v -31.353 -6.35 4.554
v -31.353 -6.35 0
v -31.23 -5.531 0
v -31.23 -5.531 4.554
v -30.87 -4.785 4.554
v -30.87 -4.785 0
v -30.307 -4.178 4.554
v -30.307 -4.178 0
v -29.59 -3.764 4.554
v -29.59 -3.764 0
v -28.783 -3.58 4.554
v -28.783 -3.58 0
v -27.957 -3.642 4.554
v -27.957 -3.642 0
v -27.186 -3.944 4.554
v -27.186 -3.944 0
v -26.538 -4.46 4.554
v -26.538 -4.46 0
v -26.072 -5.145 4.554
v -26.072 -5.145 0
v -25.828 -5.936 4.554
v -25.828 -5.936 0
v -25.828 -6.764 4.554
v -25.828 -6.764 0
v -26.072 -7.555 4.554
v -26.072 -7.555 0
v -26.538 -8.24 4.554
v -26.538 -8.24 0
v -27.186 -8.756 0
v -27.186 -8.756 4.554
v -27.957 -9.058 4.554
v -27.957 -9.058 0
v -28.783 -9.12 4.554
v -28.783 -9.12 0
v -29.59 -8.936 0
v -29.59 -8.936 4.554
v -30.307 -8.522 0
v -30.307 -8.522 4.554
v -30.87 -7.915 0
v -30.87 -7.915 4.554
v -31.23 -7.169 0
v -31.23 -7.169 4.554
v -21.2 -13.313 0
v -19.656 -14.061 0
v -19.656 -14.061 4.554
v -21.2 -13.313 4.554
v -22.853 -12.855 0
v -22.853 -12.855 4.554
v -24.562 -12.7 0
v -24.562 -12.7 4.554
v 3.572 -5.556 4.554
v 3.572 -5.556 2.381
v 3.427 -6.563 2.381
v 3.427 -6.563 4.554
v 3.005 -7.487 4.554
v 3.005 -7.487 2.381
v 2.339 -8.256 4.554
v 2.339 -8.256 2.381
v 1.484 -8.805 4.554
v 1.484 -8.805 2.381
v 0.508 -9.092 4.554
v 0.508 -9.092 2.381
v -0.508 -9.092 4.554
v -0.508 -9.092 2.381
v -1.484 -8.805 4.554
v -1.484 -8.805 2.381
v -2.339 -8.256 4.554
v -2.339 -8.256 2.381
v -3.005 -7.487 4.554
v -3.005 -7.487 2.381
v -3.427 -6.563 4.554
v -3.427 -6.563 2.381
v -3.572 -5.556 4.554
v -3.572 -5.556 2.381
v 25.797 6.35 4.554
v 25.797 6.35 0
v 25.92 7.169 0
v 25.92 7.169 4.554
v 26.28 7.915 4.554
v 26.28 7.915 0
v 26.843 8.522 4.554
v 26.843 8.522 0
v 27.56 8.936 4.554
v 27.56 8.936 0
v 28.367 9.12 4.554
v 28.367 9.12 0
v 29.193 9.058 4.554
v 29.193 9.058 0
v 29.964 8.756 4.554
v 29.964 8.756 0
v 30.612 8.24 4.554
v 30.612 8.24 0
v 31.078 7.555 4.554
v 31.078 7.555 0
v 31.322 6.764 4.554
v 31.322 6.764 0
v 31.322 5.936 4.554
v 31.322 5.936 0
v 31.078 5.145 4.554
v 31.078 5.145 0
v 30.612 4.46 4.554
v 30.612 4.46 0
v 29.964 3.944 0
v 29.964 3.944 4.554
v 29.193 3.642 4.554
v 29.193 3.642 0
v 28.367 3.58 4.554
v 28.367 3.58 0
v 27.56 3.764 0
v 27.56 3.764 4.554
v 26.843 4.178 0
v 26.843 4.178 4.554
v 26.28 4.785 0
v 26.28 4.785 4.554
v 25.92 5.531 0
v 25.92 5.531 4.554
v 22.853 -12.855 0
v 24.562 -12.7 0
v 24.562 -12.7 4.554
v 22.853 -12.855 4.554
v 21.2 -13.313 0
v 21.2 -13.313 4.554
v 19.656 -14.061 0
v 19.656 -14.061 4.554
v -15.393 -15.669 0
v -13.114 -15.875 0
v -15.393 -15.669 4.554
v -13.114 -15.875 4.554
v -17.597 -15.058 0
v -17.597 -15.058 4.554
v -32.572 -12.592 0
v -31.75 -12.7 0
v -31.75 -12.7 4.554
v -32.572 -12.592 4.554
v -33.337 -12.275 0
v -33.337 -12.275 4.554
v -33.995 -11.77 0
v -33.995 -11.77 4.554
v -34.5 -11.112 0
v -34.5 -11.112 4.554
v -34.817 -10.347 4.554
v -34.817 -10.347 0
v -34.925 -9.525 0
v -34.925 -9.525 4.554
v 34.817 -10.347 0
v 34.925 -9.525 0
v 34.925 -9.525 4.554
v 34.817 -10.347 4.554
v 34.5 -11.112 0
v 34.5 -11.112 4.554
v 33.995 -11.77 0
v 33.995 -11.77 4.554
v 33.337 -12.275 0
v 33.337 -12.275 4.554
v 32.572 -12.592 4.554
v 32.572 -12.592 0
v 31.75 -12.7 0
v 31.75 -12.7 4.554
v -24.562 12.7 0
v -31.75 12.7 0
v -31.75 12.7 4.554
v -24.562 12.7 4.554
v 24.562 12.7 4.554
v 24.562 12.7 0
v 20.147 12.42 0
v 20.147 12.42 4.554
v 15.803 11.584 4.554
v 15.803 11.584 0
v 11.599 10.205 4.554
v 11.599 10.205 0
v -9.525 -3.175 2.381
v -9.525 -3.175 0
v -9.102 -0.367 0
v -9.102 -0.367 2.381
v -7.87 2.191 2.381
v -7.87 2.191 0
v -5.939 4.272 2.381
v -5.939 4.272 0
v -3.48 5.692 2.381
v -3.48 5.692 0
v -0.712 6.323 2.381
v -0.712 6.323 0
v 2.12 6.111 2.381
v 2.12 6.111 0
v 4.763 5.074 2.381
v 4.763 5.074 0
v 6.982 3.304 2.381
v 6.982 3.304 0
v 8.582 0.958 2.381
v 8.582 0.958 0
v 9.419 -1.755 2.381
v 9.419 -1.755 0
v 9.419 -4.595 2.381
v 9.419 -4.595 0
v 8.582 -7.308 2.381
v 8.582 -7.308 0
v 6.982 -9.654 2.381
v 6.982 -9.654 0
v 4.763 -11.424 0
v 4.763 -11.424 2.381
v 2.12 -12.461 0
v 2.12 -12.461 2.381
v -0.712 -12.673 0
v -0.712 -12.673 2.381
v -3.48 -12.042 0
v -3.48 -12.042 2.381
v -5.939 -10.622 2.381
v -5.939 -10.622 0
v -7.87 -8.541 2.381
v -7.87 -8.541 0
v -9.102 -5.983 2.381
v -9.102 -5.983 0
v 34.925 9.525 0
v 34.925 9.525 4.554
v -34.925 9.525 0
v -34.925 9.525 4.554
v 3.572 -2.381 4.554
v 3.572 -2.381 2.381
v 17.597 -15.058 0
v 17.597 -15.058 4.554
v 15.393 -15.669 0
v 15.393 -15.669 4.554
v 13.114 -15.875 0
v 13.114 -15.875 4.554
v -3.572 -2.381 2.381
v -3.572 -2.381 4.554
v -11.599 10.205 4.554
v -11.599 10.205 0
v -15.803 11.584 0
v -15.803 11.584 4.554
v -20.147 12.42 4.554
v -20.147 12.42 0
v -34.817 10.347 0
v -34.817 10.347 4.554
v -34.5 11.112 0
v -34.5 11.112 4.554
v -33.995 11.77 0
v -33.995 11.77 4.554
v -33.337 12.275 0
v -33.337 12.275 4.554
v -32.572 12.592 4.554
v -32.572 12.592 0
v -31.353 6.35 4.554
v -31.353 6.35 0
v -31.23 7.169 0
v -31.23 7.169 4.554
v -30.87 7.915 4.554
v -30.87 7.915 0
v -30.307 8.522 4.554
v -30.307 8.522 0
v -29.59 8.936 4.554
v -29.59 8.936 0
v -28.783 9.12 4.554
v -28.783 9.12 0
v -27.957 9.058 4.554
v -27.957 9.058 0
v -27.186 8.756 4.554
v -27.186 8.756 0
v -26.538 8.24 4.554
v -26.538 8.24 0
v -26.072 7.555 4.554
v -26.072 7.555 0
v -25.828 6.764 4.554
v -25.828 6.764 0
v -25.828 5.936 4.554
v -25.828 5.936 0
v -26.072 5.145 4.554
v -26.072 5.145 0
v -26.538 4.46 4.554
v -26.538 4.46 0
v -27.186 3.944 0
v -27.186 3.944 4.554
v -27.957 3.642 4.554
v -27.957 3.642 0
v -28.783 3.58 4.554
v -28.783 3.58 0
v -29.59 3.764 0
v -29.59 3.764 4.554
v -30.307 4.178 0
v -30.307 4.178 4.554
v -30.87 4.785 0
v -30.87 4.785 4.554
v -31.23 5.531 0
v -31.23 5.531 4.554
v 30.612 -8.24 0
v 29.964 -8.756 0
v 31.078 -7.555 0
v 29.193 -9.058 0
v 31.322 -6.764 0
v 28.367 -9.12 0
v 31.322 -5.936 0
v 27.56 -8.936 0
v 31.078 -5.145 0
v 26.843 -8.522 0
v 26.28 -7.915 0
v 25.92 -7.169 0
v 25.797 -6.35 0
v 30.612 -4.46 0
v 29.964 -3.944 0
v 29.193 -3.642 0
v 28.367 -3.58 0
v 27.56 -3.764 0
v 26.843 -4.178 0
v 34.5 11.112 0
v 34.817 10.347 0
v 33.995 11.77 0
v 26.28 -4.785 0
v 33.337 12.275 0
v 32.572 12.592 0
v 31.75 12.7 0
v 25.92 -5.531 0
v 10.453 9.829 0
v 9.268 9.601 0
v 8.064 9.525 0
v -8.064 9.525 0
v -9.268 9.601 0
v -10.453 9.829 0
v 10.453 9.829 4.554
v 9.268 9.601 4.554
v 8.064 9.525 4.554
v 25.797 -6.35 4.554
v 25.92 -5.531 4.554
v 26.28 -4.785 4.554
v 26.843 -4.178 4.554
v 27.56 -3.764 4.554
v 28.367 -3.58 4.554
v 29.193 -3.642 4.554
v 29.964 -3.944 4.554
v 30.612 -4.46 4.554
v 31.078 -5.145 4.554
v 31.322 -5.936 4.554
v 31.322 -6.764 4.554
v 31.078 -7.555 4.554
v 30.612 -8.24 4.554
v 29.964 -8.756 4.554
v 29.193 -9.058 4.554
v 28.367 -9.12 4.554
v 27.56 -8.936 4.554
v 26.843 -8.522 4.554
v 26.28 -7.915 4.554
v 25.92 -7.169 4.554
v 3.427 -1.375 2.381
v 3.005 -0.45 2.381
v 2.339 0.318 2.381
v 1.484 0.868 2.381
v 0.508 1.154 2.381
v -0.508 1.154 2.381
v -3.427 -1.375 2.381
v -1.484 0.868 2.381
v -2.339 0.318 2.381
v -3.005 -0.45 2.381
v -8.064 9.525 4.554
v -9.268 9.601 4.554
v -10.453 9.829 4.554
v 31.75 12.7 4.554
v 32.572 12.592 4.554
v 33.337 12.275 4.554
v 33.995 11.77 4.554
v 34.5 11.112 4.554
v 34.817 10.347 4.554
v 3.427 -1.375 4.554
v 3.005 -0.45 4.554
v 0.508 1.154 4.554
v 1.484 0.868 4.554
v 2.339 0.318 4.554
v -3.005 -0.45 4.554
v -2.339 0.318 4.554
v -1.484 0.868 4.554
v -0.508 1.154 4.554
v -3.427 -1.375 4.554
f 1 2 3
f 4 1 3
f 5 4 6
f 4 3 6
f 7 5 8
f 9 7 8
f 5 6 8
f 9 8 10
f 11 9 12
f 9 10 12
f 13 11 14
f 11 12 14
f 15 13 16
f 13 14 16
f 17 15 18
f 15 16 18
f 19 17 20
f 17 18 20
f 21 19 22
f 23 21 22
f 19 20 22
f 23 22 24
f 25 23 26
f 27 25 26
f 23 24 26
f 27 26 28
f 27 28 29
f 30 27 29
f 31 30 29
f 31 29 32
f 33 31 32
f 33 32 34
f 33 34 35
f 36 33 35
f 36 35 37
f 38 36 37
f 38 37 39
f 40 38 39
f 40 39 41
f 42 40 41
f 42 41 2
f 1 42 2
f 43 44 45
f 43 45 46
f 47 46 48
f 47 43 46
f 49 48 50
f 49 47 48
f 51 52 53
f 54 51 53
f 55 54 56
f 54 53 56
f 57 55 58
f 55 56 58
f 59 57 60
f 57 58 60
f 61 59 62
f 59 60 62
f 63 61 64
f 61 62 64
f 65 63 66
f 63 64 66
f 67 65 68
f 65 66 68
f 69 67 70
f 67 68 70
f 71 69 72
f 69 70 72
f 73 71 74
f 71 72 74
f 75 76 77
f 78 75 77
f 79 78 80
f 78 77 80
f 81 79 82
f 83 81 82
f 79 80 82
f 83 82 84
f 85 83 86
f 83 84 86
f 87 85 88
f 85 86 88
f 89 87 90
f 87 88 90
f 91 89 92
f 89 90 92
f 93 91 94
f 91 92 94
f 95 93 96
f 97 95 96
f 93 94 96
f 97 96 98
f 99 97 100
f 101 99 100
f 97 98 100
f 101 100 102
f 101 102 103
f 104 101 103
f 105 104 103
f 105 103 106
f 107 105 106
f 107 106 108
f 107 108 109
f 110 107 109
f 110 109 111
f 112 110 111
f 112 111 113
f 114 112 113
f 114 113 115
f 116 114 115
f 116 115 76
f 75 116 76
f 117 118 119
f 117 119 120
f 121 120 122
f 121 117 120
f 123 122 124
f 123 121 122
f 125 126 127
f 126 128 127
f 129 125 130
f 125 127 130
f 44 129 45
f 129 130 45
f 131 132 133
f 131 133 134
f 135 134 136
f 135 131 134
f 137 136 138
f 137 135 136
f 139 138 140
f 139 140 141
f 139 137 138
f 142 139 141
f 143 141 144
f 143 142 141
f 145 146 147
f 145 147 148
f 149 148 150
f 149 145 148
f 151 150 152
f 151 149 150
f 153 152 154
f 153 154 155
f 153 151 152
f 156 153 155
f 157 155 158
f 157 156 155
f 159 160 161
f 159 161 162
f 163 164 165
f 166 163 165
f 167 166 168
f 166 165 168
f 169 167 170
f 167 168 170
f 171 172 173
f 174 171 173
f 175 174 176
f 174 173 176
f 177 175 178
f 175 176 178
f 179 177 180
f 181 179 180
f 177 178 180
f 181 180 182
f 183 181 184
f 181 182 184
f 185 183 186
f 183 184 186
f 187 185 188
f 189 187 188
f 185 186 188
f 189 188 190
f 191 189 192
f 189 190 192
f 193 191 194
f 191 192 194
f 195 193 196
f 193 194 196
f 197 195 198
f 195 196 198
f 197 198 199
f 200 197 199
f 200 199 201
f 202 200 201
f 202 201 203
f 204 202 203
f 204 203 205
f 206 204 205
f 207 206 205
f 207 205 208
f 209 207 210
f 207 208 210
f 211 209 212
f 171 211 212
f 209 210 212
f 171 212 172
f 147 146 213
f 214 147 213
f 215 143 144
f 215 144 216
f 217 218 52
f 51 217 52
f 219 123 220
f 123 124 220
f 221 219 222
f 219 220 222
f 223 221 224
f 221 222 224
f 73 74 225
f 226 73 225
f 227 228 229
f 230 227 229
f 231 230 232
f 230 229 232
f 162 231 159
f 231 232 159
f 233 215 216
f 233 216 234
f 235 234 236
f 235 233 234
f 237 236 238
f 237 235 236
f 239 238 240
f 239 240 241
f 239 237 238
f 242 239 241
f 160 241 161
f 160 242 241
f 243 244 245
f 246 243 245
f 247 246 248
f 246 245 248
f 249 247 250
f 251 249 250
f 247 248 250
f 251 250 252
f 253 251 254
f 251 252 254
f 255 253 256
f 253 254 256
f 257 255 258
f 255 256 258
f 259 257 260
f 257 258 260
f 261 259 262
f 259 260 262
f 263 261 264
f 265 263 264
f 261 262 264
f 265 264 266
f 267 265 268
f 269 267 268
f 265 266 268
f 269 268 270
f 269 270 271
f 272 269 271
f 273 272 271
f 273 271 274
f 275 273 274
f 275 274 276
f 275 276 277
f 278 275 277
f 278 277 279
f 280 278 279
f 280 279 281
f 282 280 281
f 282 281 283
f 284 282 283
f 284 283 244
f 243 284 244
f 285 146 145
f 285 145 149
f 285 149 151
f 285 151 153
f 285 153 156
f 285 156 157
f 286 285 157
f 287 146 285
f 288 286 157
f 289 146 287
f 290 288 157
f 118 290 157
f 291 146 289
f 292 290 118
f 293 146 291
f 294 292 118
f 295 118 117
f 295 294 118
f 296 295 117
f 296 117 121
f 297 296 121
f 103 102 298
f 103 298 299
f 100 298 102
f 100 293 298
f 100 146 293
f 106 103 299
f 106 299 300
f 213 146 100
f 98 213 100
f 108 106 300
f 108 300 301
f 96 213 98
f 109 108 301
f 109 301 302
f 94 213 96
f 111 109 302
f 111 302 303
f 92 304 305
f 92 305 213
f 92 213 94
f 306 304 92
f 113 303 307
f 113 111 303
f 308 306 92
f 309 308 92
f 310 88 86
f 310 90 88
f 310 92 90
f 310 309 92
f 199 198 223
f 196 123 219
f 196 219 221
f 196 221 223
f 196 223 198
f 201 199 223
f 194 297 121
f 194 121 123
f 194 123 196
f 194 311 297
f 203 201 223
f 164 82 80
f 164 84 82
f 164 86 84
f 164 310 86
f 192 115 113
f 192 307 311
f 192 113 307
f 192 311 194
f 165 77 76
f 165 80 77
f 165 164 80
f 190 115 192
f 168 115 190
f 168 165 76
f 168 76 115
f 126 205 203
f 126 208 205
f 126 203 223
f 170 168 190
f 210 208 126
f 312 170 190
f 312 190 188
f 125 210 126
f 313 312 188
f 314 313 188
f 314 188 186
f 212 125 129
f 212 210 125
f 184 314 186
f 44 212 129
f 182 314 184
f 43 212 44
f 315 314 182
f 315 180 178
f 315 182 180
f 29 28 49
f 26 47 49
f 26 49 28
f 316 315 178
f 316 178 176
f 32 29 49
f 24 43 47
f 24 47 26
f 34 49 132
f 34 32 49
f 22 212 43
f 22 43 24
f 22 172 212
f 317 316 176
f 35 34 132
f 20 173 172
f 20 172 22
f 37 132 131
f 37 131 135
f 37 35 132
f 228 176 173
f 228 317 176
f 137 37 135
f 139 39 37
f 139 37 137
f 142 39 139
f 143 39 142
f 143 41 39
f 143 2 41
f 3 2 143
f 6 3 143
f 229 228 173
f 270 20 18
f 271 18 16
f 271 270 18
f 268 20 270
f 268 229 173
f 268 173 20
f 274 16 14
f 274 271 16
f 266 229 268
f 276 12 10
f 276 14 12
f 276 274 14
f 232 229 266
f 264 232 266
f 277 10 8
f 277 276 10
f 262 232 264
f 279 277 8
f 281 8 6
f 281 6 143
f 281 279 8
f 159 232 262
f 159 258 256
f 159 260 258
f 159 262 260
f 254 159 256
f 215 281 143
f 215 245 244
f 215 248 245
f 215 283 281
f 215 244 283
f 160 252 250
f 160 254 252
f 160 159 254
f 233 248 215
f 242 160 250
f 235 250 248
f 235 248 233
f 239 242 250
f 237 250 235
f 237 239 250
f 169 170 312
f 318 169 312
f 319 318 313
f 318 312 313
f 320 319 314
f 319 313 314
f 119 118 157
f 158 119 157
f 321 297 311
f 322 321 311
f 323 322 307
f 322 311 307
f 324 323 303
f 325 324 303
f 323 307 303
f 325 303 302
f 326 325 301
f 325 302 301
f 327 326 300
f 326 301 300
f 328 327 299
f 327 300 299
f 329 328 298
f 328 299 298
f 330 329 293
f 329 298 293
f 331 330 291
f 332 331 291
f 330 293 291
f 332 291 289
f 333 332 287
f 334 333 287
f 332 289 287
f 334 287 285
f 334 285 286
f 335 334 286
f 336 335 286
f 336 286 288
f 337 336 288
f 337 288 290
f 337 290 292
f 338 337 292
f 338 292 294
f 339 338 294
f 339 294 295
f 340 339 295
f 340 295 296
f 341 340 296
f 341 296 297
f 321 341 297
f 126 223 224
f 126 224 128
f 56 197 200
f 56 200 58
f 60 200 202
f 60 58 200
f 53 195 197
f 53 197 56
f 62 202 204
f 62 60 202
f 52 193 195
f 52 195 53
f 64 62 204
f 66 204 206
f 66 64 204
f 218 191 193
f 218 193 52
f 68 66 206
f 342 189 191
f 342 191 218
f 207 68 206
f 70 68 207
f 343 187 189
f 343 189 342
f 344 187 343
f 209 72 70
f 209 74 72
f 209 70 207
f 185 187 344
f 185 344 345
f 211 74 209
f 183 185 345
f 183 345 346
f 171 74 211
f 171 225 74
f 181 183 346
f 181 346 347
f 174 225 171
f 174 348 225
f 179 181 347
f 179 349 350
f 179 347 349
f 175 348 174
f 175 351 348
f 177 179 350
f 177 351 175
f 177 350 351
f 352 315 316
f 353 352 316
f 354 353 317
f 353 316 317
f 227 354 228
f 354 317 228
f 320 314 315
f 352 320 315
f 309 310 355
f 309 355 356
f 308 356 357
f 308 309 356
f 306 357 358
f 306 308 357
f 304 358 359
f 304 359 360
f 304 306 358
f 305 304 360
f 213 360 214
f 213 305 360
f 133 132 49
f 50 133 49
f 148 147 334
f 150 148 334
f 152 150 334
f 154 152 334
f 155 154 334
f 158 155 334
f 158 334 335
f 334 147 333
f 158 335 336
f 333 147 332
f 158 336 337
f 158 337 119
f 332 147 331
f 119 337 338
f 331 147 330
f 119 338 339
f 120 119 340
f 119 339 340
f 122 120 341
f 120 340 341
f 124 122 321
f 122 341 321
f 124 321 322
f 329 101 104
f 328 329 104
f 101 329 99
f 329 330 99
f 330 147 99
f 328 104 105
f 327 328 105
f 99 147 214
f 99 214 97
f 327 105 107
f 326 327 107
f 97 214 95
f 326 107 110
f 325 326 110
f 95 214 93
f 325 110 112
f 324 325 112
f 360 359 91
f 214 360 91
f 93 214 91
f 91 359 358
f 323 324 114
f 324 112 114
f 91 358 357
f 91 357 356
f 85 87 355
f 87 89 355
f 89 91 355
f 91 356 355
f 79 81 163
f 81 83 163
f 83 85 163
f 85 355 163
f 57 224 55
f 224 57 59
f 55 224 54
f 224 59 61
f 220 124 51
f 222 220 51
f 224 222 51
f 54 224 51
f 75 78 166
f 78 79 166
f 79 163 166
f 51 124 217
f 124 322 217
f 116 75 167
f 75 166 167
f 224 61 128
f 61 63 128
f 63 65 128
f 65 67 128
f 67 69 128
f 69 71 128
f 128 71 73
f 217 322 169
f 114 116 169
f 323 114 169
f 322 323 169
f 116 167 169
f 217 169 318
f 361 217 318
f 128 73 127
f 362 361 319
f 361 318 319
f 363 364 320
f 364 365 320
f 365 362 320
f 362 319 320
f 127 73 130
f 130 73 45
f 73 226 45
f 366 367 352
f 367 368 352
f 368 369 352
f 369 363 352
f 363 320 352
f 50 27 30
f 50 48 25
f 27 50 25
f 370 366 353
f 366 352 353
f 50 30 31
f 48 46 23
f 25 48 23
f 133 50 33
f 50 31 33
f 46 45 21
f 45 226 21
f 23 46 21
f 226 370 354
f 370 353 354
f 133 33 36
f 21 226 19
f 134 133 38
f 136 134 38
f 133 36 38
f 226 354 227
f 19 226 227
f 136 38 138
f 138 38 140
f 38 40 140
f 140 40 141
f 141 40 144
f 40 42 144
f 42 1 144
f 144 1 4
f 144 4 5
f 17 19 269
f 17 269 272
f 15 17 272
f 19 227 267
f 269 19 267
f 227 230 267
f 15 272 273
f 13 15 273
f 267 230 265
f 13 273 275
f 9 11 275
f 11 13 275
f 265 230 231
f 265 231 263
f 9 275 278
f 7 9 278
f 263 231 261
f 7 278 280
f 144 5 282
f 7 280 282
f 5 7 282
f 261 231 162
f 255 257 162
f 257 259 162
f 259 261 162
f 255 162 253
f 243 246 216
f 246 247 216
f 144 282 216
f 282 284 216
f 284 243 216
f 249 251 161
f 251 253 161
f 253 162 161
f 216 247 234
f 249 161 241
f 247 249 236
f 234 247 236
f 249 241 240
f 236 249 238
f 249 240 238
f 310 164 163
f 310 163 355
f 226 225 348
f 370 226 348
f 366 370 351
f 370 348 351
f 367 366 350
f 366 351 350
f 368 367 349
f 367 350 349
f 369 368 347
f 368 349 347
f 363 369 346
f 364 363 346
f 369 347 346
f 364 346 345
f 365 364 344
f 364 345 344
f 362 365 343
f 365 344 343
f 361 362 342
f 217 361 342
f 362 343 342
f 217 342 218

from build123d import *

# Parameters (mm, degrees)
SKETCH1_W                       = 69.85
SKETCH1_H                       = 25.4
BASE_FLANGE1_DEPTH              = 4.55422
F_7_32_0_21875_DIAMETER_HOLE1_D = 5.55625
BREAK_CORNER1_DEPTH             = 4.55422
SKETCH4_W                       = 34.925
SKETCH4_H                       = 3.175
TAB1_DEPTH                      = 4.55422
FILLET1_R                       = 9.525
CUT_EXTRUDE1_REACH              = 40.633
SKETCH7_R                       = 9.525
CUT_EXTRUDE3_DEPTH              = 2.38125
F_9_32_0_28125_DIAMETER_HOLE1_D = 7.14375
FILLET3_R                       = 12.7
CUT_EXTRUDE4_START              = -2.17297
CUT_EXTRUDE4_DEPTH              = 2.17297


# Read off the part's stored shape, not the designer's step: Break-Corner1
# Sheet-metal steps are written as plain solids
with BuildPart() as part:
    # Sketch1 → Base-Flange1 (new body)
    with BuildSketch(Plane.XY):
        Rectangle(SKETCH1_W, SKETCH1_H)
    extrude(amount=BASE_FLANGE1_DEPTH)

    # 7/32 (0.21875) Diameter Hole1 (through all)
    with Locations(Plane.XY.offset(4.55422)):
        with Locations((-28.575, 6.35), (-28.575, -6.35), (28.575, 6.35), (28.575, -6.35)):
            Hole(F_7_32_0_21875_DIAMETER_HOLE1_D / 2)

    # Break-Corner1 outline → Break-Corner1 (cut)
    with BuildSketch(Plane.XY):
        with BuildLine():
            Line((34.925, -12.7), (34.925, -9.525))
            ThreePointArc((34.925, -9.525), (33.99506403, -11.77006403), (31.75, -12.7))
            Line((31.75, -12.7), (34.925, -12.7))
        make_face()
        with BuildLine():
            ThreePointArc((31.75, 12.7), (33.99506403, 11.77006403), (34.925, 9.525))
            Line((34.925, 9.525), (34.925, 12.7))
            Line((34.925, 12.7), (31.75, 12.7))
        make_face()
        with BuildLine():
            Line((-34.925, -12.7), (-31.75, -12.7))
            ThreePointArc((-31.75, -12.7), (-33.99506403, -11.77006403), (-34.925, -9.525))
            Line((-34.925, -9.525), (-34.925, -12.7))
        make_face()
        with BuildLine():
            ThreePointArc((-34.925, 9.525), (-33.99506403, 11.77006403), (-31.75, 12.7))
            Line((-31.75, 12.7), (-34.925, 12.7))
            Line((-34.925, 12.7), (-34.925, 9.525))
        make_face()
    extrude(amount=BREAK_CORNER1_DEPTH, mode=Mode.SUBTRACT)

    # Sketch4 → Tab1 (add)
    with BuildSketch(Plane(origin=(0, 0, 0), x_dir=(-1, 0, 0), z_dir=(0, 0, -1))):
        with Locations((0, -14.2875)):
            Rectangle(SKETCH4_W, SKETCH4_H)
    extrude(amount=-TAB1_DEPTH)

    # Fillet1
    # the kernel refuses this fillet: 9.525 mm, written as the material it adds along each edge
    with BuildSketch(Plane(origin=(-17.4625, -12.7, 0), x_dir=(-1, 0, 0), z_dir=(0, 0, 1))) as fillet1_piece_1:
        with BuildLine():
            CenterArc((7.099515829, 9.525), FILLET1_R, 221.810314896, 48.189685104)
            Line((0, 3.175), (-0.141990317, 3.048))
            ThreePointArc((-0.141990317, 3.048), (-0.1905, 1.5875), (-0.1905, 0))
            Line((-0.1905, 0), (0, -0.1905))
            Line((0, -0.1905), (7.099515829, -0.1905))
            Line((7.099515829, -0.1905), (7.099515829, 0))
        make_face()
    extrude(amount=4.55422)
    with BuildSketch(Plane(origin=(17.4625, -12.7, 0), x_dir=(1, 0, 0), z_dir=(0, 0, 1))) as fillet1_piece_2:
        with BuildLine():
            CenterArc((7.099515829, -9.525), FILLET1_R, 90, 48.189685104)
            Line((0, -3.175), (-0.141990317, -3.048))
            ThreePointArc((-0.141990317, -3.048), (-0.1905, -1.5875), (-0.1905, 0))
            Line((-0.1905, 0), (0, 0.1905))
            Line((0, 0.1905), (7.099515829, 0.1905))
            Line((7.099515829, 0.1905), (7.099515829, 0))
        make_face()
    extrude(amount=4.55422)

    # Sketch5 → Cut-Extrude1 (cut, up to next)
    with BuildSketch(Plane(origin=(0, 0, 0), x_dir=(-1, 0, 0), z_dir=(0, 0, -1)), mode=Mode.PRIVATE) as cut_extrude1_sk1:
        with BuildLine():
            Line((-8.064231886, 9.525), (8.064231886, 9.525))
            ThreePointArc((8.064231886, 9.525), (9.864287689, 9.69663568), (11.599471303, 10.205357143))
            ThreePointArc((11.599471303, 10.205357143), (17.961811219, 12.070669174), (24.562015829, 12.7))
            Line((24.562015829, 12.7), (-24.562015829, 12.7))
            ThreePointArc((-24.562015829, 12.7), (-17.961811219, 12.070669174), (-11.599471303, 10.205357143))
            ThreePointArc((-11.599471303, 10.205357143), (-9.864287689, 9.69663568), (-8.064231886, 9.525))
        make_face()
    cut_extrude1_tool1 = extrude(cut_extrude1_sk1.sketch, amount=-CUT_EXTRUDE1_REACH, mode=Mode.PRIVATE) & part.part
    add(cut_extrude1_tool1.solids().sort_by_distance((0, 11.328032, 0))[0], mode=Mode.SUBTRACT)

    # Sketch7 → Cut-Extrude3 (cut)
    with BuildSketch(Plane(origin=(0, 0, 0), x_dir=(-1, 0, 0), z_dir=(0, 0, -1))):
        with Locations((0, -3.175)):
            Circle(SKETCH7_R)
    extrude(amount=-CUT_EXTRUDE3_DEPTH, mode=Mode.SUBTRACT)

    # 9/32 (0.28125) Diameter Hole1 (through all)
    with Locations(Plane(origin=(0, 0, 2.38125), x_dir=(-1, 0, 0), z_dir=(0, 0, -1))):
        with Locations((0, -3.175)):
            Hole(F_9_32_0_28125_DIAMETER_HOLE1_D / 2)

    # Fillet3
    fillet3_edges = [part.edges().sort_by_distance(p)[0] for p in [
        (17.4625, -15.875, 2.27711),
        (-17.4625, -15.875, 2.27711),
    ]]
    fillet(fillet3_edges, radius=FILLET3_R)

    # Sketch10 → Cut-Extrude4 (cut)
    with BuildSketch(Plane.XY.offset(4.55422).offset(CUT_EXTRUDE4_START)):
        with BuildLine():
            Line((3.571875, -2.38125), (3.571875, -5.55625))
            ThreePointArc((3.571875, -5.55625), (0, -9.128125), (-3.571875, -5.55625))
            Line((-3.571875, -5.55625), (-3.571875, -2.38125))
            ThreePointArc((-3.571875, -2.38125), (0, 1.190625), (3.571875, -2.38125))
        make_face()
    extrude(amount=CUT_EXTRUDE4_DEPTH, mode=Mode.SUBTRACT)


solid = part.part
